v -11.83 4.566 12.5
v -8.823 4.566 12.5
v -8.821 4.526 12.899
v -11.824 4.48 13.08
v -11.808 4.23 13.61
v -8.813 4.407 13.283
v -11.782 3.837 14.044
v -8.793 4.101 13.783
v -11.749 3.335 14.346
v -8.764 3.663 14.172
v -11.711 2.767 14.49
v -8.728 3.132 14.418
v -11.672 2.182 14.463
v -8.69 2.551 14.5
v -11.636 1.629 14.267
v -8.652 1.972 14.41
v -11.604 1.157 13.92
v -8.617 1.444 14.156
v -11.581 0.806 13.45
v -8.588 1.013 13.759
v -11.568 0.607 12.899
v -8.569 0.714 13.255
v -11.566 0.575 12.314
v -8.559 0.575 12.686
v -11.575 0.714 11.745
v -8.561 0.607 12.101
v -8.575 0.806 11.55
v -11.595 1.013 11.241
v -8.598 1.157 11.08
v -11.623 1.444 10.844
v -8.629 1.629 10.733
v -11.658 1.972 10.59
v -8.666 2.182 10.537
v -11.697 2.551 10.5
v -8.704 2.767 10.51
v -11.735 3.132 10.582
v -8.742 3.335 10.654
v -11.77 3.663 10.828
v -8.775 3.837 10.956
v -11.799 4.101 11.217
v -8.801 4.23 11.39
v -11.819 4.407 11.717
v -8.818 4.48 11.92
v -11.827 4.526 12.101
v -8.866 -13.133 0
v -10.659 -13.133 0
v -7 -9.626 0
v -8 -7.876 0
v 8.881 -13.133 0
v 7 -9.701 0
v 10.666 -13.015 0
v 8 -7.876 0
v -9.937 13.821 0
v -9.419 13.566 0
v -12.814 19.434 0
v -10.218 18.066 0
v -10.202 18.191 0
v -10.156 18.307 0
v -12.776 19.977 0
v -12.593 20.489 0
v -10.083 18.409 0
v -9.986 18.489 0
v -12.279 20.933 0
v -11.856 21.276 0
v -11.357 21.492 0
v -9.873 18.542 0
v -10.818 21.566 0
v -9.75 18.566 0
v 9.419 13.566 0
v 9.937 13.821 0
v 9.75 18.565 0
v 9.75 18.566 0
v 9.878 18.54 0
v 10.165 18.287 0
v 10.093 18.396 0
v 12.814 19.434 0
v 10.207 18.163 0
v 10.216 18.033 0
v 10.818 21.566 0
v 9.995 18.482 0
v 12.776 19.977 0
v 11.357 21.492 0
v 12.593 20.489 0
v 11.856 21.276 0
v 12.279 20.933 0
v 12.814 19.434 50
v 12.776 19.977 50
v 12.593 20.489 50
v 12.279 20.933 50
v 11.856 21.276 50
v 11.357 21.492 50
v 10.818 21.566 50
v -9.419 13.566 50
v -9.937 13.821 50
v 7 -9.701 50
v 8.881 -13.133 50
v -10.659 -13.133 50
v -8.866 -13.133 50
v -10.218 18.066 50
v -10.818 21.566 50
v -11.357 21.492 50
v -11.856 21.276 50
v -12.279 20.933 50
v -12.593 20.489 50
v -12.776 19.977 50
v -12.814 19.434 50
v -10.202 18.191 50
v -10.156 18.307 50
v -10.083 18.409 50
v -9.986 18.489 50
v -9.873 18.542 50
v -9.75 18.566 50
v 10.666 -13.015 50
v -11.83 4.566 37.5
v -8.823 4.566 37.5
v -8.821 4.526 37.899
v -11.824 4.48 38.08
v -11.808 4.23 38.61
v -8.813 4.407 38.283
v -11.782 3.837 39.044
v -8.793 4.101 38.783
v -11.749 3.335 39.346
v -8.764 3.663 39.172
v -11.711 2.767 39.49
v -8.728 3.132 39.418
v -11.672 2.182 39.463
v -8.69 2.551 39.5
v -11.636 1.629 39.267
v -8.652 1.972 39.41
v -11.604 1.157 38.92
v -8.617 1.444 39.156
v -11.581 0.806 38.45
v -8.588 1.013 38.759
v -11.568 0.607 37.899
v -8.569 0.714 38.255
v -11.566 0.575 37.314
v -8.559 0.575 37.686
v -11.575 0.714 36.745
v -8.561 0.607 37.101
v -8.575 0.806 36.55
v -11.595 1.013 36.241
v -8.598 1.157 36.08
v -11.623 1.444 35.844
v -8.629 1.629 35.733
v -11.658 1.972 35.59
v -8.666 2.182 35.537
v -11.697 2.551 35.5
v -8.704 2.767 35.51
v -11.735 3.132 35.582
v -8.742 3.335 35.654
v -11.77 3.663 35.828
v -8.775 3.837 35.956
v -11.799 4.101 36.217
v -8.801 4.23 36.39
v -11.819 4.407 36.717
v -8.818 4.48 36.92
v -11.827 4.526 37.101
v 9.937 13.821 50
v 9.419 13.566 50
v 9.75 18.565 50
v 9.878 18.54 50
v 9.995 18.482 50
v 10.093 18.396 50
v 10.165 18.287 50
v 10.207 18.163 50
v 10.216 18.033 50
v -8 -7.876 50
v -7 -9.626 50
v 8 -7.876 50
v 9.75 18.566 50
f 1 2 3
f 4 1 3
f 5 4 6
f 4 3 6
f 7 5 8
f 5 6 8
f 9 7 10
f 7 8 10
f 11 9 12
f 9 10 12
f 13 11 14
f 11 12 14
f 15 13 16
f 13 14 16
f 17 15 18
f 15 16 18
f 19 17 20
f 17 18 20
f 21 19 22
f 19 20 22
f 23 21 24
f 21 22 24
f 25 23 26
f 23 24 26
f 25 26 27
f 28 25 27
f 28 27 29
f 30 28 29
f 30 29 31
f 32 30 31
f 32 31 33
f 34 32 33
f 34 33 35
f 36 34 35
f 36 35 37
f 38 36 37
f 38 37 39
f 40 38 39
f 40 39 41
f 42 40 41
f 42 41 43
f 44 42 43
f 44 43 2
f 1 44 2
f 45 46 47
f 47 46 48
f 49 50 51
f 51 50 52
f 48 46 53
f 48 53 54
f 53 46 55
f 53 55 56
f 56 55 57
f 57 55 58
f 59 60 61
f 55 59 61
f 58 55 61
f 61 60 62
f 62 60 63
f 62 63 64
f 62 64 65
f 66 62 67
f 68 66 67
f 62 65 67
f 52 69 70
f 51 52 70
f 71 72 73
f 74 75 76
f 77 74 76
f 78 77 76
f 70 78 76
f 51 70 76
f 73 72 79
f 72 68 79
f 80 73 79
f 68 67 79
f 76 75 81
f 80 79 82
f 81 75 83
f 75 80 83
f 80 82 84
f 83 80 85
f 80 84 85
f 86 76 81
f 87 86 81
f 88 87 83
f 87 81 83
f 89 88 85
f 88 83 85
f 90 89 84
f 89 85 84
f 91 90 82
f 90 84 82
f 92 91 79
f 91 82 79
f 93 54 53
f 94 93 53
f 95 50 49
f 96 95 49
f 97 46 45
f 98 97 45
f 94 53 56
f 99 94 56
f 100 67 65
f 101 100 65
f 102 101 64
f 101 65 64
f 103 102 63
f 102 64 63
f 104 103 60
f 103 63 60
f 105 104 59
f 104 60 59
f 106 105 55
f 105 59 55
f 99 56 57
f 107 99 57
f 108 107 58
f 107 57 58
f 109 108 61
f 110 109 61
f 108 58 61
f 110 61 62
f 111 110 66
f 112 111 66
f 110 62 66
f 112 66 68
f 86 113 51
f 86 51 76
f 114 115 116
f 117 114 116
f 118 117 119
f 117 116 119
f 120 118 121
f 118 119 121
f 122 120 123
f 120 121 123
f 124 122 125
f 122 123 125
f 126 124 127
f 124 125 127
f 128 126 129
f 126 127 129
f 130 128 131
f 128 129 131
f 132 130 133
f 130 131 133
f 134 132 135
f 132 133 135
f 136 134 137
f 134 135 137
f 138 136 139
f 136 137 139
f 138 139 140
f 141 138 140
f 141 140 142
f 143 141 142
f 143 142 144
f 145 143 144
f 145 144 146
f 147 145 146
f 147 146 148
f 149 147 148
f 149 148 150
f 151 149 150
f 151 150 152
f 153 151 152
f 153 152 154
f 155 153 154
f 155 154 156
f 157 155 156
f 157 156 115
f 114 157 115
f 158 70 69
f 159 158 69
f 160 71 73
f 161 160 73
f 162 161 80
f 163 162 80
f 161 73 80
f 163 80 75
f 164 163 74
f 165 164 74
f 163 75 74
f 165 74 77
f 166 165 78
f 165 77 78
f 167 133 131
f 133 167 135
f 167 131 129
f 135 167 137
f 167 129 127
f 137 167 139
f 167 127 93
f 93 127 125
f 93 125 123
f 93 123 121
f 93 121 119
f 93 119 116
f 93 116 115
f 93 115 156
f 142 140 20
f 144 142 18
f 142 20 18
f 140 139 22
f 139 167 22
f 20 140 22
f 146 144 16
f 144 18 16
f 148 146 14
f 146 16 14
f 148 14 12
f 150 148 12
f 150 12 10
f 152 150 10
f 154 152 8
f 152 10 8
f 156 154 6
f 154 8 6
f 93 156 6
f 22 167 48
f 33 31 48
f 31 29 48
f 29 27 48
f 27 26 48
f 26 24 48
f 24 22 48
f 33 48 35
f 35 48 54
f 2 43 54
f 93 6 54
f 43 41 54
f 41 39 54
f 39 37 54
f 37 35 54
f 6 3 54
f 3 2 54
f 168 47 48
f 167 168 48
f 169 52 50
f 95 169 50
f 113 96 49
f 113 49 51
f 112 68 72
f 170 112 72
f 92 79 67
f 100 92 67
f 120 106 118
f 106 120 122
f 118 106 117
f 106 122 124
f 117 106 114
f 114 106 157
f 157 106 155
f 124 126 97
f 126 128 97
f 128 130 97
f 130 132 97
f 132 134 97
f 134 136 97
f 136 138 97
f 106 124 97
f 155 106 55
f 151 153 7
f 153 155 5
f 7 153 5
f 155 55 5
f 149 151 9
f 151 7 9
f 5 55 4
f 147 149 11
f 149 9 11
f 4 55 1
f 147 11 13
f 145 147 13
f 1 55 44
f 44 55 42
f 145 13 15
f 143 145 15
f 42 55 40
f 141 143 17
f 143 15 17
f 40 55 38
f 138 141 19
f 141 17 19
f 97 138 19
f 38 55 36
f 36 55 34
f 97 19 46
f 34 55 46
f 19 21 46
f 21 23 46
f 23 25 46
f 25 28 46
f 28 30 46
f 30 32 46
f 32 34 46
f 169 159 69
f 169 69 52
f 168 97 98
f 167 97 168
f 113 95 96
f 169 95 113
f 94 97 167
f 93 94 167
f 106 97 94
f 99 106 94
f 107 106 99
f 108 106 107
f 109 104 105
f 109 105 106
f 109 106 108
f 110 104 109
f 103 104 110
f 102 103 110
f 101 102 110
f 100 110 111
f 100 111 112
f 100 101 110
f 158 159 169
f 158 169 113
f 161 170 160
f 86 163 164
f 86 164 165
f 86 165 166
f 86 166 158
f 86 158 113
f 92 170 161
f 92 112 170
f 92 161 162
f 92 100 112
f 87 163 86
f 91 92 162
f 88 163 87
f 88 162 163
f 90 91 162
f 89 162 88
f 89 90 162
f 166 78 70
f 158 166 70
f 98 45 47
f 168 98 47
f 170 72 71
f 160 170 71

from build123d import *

# Parameters (mm, degrees)
F1_DEPTH = 50
F2_R     = 2
F3_DEPTH = 25


with BuildPart() as f1:
    # F0 (on Top) → F1 (new body)
    with BuildSketch(Plane.XY):
        with BuildLine():
            ThreePointArc((-10.218003, 18.066239), (-10.082748, 18.408666), (-9.75, 18.566239))
            Line((-9.75, 18.566239), (9.75, 18.566239))
            Line((9.75, 18.566239), (9.749928, 18.565147))
            ThreePointArc((9.749928, 18.565147), (10.093038, 18.395673), (10.215817, 18.03322))
            Line((10.215817, 18.03322), (9.937061, 13.821265))
            Line((9.937061, 13.821265), (9.419089, 13.566239))
            Line((9.419089, 13.566239), (8, -7.875915))
            Line((8, -7.875915), (7, -9.70099))
            Line((7, -9.70099), (8.880575, -13.133215))
            Line((8.880575, -13.133215), (10.666446, -13.015022))
            Line((10.666446, -13.015022), (12.814004, 19.434163))
            ThreePointArc((12.814004, 19.434163), (12.278533, 20.932959), (10.81837, 21.566239))
            Line((10.81837, 21.566239), (-10.81837, 21.566239))
            ThreePointArc((-10.81837, 21.566239), (-12.278533, 20.932959), (-12.814004, 19.434163))
            Line((-12.814004, 19.434163), (-10.658623, -13.133215))
            Line((-10.658623, -13.133215), (-8.866173, -13.133215))
            Line((-8.866173, -13.133215), (-7, -9.625915))
            Line((-7, -9.625915), (-8, -7.875915))
            Line((-8, -7.875915), (-9.419089, 13.566239))
            Line((-9.419089, 13.566239), (-9.937061, 13.821265))
            Line((-9.937061, 13.821265), (-10.218003, 18.066239))
        make_face()
    extrude(amount=F1_DEPTH)

    # F2 (on Right) → F3 (cut)
    with BuildSketch(Plane.YZ):
        with Locations((2.566239, 12.5)):
            Circle(F2_R)
        with Locations((2.566239, 37.5)):
            Circle(F2_R)
    extrude(amount=-F3_DEPTH, mode=Mode.SUBTRACT)


solid = f1.part
